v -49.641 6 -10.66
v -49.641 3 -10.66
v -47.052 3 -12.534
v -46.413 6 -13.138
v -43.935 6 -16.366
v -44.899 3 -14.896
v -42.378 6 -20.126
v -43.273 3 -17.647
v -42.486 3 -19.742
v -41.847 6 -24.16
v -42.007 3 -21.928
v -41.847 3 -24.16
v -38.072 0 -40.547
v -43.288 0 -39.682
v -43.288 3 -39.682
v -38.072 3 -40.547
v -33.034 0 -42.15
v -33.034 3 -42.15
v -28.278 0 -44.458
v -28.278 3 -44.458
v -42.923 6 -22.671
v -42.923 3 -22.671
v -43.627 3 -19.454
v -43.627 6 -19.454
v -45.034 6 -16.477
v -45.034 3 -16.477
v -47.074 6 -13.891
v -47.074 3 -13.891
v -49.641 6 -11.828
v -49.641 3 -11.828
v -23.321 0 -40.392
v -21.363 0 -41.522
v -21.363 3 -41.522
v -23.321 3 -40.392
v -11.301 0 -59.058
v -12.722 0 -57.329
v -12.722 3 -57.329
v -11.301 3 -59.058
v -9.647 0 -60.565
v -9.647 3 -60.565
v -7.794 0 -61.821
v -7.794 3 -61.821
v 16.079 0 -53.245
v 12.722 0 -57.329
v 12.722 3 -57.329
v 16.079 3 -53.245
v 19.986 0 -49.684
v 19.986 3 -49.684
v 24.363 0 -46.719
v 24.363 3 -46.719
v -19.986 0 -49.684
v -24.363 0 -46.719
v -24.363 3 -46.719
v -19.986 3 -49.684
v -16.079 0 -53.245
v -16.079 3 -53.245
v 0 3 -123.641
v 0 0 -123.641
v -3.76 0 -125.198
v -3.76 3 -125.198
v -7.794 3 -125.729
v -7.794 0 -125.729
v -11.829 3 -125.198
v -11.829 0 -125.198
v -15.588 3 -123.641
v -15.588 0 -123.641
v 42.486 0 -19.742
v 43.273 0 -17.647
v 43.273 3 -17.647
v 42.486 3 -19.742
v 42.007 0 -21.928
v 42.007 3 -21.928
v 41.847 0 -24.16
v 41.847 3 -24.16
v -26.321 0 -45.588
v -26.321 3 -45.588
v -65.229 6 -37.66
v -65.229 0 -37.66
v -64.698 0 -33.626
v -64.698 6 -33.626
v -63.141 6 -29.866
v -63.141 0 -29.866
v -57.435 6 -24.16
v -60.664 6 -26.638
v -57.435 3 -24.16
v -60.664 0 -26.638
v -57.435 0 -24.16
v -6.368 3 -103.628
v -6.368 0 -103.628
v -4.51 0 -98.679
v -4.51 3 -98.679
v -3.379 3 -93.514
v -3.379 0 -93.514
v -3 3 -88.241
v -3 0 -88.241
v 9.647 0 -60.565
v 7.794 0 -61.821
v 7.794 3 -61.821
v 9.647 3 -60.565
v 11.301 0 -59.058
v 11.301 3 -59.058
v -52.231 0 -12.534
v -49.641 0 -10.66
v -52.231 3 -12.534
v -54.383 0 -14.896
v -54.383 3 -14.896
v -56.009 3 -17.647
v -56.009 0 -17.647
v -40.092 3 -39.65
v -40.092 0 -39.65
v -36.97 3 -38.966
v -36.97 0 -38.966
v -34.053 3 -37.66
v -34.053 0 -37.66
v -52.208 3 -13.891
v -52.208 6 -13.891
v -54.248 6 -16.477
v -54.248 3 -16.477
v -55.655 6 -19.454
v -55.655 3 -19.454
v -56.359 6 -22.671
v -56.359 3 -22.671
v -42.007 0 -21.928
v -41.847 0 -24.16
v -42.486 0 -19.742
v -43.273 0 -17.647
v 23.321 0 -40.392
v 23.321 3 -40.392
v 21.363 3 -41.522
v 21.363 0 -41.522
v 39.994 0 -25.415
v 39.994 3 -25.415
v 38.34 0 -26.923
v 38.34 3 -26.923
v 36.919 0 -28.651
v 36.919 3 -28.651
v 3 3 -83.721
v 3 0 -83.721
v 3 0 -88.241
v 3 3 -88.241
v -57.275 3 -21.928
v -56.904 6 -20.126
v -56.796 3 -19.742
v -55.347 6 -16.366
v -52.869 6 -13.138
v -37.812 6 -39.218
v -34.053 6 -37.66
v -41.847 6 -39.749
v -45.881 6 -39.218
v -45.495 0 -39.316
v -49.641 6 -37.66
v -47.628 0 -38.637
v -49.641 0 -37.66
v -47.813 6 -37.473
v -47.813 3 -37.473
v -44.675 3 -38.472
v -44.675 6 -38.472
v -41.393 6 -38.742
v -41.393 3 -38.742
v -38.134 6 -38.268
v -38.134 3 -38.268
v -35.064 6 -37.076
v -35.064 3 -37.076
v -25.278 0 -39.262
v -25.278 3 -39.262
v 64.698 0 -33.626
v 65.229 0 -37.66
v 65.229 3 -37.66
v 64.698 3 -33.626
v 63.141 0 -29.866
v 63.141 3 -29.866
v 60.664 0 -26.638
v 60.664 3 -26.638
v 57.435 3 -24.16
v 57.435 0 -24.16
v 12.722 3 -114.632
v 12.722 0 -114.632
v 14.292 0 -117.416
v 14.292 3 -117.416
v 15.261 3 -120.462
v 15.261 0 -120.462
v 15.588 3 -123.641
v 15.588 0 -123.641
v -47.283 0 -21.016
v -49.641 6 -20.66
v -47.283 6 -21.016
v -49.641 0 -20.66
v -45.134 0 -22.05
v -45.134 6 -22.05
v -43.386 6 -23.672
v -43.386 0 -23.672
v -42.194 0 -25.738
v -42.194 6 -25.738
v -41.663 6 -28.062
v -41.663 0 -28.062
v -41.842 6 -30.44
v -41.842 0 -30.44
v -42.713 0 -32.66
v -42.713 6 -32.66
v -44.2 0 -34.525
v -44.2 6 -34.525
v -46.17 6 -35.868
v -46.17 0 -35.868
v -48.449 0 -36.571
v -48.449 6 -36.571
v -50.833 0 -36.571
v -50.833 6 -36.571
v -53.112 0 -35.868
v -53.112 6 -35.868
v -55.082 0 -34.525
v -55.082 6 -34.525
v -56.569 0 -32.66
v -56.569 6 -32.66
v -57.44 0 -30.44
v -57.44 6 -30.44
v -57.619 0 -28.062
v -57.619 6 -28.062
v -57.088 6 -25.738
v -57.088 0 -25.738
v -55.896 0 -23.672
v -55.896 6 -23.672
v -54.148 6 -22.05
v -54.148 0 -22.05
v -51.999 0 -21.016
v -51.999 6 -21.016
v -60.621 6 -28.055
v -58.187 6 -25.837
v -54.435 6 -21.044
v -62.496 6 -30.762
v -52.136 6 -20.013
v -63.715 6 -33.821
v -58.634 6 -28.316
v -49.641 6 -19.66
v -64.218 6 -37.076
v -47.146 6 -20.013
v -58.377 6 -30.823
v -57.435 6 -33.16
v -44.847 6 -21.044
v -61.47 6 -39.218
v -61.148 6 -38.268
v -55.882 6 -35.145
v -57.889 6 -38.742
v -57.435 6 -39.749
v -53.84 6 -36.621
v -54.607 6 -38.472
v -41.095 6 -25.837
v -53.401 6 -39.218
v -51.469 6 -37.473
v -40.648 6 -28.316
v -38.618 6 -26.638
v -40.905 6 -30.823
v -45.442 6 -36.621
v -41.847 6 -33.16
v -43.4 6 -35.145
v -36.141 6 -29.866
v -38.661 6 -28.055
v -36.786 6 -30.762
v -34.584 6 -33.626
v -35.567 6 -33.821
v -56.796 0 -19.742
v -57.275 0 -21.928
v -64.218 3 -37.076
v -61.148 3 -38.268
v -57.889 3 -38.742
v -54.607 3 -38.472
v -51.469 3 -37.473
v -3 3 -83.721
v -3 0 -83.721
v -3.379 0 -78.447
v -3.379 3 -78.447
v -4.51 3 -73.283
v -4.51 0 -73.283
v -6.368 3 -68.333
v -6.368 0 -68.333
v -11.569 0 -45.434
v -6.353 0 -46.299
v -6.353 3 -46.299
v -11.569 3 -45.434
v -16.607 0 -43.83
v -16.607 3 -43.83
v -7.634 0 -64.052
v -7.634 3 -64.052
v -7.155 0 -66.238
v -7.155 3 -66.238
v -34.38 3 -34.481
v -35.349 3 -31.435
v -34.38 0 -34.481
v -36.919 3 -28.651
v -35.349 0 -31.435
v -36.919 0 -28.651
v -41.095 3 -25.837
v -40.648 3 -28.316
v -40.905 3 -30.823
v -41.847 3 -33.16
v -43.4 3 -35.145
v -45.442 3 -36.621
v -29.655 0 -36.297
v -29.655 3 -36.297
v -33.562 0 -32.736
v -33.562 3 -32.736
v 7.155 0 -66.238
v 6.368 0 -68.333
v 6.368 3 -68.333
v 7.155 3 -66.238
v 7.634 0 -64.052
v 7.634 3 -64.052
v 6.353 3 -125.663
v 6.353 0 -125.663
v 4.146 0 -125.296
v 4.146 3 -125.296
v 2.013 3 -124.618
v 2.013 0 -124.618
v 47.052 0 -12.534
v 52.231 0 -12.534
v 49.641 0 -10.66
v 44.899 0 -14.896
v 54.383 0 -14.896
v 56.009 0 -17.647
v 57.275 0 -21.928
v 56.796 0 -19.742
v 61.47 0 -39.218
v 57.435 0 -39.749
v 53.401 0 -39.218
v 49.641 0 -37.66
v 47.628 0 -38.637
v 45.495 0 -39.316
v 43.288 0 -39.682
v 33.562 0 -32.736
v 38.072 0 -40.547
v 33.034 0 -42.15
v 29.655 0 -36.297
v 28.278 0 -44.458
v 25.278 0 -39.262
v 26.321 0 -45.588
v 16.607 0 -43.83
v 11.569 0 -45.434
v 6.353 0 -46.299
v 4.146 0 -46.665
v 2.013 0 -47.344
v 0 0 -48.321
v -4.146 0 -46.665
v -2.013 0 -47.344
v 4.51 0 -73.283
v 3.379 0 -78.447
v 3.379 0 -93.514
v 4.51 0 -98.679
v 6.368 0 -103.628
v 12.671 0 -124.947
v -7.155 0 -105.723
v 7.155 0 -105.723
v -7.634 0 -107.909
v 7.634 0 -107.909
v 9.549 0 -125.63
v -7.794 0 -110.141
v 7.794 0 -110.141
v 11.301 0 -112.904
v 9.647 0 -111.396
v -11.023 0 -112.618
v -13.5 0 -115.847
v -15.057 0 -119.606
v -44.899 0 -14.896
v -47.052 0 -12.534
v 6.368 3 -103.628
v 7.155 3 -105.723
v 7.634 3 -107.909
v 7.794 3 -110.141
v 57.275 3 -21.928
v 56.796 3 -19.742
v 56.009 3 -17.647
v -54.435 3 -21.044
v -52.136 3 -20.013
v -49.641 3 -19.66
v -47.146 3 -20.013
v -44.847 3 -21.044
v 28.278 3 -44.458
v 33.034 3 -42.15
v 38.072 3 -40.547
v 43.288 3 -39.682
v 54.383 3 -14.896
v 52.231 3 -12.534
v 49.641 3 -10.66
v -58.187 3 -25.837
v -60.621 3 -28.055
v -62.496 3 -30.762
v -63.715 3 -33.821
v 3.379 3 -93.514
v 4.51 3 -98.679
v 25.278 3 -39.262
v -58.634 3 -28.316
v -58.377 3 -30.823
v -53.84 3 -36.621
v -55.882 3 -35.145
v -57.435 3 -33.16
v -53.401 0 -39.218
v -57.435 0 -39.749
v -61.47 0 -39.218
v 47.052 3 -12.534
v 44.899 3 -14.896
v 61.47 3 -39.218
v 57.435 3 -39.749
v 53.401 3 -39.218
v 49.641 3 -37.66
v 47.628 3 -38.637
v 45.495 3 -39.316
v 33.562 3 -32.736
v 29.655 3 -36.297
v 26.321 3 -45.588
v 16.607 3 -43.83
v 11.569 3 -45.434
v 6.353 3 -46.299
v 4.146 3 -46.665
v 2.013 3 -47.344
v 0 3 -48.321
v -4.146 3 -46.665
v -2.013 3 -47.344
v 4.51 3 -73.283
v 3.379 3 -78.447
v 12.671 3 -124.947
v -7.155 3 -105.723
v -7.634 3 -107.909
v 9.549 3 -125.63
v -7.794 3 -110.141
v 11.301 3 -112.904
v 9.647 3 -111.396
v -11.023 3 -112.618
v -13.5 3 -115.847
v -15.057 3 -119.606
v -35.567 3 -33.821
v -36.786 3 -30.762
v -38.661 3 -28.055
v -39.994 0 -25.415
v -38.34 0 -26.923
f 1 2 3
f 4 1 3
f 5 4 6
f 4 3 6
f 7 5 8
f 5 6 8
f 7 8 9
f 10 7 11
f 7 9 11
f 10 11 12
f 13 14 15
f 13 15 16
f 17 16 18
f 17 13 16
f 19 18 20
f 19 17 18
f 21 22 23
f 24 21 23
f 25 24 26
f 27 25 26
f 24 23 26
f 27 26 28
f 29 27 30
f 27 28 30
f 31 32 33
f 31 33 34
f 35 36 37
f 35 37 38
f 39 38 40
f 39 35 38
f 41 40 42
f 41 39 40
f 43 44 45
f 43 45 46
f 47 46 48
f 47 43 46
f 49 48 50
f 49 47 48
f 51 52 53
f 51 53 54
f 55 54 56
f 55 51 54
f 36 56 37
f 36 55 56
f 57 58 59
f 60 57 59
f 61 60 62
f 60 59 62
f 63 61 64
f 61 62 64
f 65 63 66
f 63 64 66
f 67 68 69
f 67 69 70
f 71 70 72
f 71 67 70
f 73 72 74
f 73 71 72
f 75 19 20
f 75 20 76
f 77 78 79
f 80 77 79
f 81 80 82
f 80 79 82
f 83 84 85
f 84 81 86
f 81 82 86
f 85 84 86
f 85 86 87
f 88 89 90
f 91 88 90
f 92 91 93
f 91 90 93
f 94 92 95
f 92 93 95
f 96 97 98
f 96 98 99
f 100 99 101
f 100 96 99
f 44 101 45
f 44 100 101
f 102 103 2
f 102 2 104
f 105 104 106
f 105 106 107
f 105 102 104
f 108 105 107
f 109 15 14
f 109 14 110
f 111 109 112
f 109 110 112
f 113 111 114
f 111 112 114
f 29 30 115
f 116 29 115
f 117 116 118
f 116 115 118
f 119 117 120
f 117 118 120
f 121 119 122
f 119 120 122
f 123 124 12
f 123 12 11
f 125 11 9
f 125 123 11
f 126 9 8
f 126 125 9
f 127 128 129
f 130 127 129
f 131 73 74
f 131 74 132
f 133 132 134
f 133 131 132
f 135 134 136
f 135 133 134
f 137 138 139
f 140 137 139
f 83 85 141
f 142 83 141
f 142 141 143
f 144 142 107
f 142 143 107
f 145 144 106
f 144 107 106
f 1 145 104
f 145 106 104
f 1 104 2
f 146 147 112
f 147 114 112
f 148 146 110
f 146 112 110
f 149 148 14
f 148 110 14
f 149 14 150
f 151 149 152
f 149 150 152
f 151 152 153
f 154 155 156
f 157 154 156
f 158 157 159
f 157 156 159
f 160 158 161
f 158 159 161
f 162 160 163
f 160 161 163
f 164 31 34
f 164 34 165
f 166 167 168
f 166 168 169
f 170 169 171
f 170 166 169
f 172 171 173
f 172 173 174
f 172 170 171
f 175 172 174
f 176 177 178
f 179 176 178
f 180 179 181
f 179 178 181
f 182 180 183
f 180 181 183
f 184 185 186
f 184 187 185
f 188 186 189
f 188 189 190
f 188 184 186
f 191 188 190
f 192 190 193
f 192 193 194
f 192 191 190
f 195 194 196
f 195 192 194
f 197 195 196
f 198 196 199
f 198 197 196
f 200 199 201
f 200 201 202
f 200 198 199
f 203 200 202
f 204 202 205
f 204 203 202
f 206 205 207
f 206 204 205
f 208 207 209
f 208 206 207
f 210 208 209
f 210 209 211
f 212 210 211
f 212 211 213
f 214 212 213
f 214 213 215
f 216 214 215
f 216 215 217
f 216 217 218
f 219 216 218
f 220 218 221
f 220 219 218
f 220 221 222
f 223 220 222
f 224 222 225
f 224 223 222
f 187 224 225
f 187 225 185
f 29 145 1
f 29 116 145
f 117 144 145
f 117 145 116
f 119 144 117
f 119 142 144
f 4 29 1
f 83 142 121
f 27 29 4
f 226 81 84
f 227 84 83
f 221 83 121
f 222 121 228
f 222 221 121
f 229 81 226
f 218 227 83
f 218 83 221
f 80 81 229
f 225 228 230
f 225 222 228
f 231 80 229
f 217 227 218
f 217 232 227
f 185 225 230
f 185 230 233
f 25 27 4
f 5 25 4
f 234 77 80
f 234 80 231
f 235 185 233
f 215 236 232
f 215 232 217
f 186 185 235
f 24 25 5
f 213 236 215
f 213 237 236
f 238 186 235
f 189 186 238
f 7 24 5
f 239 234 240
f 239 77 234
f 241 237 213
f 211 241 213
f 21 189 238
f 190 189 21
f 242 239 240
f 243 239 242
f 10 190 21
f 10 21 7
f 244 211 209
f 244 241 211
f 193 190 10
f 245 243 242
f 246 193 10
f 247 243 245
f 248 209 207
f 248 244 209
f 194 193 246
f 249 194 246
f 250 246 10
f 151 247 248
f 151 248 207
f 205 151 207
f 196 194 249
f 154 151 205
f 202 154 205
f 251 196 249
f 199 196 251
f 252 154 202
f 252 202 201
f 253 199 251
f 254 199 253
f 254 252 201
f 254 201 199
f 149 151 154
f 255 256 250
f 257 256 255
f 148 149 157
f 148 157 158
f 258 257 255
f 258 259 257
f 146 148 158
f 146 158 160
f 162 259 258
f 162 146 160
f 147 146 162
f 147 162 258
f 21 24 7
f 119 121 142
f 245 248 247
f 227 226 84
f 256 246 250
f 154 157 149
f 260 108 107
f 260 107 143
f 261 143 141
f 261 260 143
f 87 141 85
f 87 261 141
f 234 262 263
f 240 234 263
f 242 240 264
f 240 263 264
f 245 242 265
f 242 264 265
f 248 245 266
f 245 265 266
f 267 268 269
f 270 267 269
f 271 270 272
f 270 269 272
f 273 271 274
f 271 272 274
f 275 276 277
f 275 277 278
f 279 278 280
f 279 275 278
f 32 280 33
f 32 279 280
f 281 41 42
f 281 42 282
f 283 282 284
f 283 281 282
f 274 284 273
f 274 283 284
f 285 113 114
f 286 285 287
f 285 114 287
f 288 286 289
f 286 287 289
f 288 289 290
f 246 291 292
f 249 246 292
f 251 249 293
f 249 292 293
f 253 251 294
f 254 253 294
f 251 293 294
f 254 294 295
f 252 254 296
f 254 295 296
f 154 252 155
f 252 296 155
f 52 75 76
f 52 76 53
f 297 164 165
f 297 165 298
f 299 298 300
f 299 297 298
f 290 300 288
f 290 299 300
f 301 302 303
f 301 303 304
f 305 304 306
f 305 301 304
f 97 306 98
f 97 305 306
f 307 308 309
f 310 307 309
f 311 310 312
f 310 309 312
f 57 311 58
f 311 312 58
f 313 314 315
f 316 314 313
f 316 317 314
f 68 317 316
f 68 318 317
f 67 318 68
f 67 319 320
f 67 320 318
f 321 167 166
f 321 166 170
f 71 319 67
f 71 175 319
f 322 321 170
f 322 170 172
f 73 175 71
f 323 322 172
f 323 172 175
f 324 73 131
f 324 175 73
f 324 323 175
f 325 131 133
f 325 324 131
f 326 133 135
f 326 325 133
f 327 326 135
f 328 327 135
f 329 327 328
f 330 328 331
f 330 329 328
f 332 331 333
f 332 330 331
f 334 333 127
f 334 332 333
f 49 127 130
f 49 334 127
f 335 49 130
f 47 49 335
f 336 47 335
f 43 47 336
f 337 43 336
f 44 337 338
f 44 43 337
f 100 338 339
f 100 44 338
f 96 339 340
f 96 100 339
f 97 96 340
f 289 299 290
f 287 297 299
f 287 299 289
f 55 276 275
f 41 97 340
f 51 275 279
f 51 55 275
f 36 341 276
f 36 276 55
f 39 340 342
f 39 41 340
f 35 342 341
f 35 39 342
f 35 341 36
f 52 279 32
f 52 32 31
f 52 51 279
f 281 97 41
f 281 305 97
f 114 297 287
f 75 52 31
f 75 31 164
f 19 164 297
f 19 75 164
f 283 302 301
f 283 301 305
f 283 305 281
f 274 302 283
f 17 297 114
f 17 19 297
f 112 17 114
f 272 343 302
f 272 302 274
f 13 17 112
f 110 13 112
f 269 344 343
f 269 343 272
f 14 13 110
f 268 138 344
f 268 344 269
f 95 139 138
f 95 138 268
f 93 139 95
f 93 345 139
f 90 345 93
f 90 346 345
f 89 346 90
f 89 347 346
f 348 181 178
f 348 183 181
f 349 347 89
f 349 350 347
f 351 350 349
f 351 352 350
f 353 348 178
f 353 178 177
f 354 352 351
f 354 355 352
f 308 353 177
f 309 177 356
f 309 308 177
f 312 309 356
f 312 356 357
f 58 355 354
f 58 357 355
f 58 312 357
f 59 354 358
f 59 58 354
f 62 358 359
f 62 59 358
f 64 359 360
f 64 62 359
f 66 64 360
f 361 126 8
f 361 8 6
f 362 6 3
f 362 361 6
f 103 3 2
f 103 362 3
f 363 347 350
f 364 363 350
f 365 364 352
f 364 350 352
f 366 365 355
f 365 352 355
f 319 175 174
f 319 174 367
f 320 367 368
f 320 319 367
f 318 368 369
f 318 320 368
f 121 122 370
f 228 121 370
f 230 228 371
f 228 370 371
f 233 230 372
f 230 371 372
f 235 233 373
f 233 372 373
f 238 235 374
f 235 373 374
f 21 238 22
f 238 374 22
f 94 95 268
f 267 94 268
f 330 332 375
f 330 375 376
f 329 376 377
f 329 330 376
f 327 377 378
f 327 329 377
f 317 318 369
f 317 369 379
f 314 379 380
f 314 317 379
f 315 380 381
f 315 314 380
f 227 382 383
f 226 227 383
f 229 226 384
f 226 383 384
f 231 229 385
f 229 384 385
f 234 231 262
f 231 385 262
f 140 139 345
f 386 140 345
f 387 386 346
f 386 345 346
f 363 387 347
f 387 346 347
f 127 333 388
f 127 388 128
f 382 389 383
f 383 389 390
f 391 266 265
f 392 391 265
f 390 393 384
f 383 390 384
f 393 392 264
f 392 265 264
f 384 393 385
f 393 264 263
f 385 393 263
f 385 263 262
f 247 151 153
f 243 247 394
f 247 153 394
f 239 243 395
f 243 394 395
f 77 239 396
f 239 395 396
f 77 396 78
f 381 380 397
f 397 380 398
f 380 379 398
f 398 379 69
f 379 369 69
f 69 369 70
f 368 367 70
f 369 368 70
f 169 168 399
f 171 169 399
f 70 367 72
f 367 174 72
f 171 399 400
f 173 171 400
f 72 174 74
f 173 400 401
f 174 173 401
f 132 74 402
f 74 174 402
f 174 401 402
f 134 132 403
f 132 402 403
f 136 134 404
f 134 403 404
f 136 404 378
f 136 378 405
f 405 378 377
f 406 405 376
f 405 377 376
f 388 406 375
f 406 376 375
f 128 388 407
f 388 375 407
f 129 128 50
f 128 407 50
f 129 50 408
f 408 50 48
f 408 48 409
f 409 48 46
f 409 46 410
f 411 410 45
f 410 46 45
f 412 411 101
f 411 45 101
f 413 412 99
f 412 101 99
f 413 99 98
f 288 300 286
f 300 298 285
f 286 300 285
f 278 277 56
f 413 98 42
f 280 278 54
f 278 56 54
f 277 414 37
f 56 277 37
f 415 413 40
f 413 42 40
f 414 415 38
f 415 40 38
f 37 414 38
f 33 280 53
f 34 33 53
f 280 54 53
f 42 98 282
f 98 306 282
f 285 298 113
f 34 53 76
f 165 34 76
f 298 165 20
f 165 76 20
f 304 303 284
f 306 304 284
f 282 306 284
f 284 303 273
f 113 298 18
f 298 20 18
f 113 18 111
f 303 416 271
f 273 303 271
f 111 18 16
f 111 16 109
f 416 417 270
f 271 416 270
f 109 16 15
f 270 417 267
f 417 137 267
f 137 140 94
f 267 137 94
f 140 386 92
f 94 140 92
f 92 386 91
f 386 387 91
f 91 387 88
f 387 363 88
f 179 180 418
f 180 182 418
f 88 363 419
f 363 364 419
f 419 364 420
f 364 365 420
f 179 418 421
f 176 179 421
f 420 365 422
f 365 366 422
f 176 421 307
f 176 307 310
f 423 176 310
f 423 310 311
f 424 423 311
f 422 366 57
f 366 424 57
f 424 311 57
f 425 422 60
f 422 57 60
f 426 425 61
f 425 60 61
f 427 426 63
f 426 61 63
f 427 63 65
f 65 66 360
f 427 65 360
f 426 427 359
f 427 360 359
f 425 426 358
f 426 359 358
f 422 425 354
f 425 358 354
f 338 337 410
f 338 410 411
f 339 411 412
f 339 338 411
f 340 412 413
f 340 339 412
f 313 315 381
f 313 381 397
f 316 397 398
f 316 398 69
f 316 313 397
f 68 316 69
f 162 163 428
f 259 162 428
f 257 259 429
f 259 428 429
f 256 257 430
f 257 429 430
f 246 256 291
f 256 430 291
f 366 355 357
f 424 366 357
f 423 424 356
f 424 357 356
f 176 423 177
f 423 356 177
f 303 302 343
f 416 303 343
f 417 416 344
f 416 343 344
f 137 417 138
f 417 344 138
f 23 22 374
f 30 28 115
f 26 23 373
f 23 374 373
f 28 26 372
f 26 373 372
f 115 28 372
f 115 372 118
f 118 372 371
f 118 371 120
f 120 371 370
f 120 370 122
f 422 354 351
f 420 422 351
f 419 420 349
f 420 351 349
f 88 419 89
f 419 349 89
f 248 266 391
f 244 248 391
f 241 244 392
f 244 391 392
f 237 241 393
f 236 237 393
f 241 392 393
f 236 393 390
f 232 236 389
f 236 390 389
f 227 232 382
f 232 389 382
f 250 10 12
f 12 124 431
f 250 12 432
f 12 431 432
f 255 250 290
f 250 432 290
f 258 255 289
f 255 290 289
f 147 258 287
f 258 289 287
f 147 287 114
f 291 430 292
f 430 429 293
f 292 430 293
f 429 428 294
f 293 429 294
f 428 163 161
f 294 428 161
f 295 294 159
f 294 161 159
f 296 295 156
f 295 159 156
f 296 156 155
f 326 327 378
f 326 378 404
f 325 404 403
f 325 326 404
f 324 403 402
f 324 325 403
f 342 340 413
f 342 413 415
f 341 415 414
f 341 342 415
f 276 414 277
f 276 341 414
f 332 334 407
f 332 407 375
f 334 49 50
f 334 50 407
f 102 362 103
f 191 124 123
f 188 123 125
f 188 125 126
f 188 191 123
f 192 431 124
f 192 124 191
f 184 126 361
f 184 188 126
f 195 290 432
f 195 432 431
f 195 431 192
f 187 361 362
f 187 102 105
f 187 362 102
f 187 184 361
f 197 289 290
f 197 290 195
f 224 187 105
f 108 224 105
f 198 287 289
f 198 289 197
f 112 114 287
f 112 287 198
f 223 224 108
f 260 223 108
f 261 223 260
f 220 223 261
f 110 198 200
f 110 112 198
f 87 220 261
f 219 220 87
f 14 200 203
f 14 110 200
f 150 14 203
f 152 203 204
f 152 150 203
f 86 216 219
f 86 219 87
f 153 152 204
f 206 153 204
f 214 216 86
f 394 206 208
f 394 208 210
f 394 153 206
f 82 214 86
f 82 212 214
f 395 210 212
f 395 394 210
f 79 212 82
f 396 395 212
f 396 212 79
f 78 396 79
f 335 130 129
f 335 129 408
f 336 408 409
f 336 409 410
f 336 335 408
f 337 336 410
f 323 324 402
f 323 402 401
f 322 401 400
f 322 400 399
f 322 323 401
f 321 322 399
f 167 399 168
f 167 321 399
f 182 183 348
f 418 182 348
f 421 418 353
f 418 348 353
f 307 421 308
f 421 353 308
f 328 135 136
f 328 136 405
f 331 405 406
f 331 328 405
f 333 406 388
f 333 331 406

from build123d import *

# Parameters (mm, degrees)
BOSS_EXTRUDE2_DEPTH    = 3
SKETCH12_R             = 8
BOSS_EXTRUDE3_DEPTH    = 3
CUT_EXTRUDE1_START     = -3
SKETCH15_R             = 8
CUT_EXTRUDE1_DEPTH     = 3
SPLIT1_SURFACE_1_BACK  = 175.059
SPLIT1_SURFACE_1_DEPTH = 350.118
SPLIT1_SURFACE_2_BACK  = 175.059
SPLIT1_SURFACE_2_DEPTH = 350.118


with BuildPart() as part:
    # Sketch3 → Boss-Extrude2 (new body)
    with BuildSketch(Plane(origin=(0, 0, 0), x_dir=(1, 0, 0), z_dir=(0, 1, 0))):
        with BuildLine():
            ThreePointArc((-49.641016151, 10.660254038), (-53.367697775, 13.659367084), (-56.009477801, 17.647328127))
            ThreePointArc((-56.009477801, 17.647328127), (-57.074631953, 20.826674302), (-57.435244785, 24.160254038))
            ThreePointArc((-57.435244785, 24.160254038), (-63.141016151, 29.866025404), (-65.229473419, 37.660254038))
            ThreePointArc((-65.229473419, 37.660254038), (-57.435244785, 39.748711306), (-49.641016151, 37.660254038))
            ThreePointArc((-49.641016151, 37.660254038), (-46.573744998, 39.014744032), (-43.287773367, 39.681966565))
            ThreePointArc((-43.287773367, 39.681966565), (-35.524464535, 41.258320585), (-28.27784895, 44.458385987))
            Line((-28.27784895, 44.458385987), (-26.320508076, 45.588457268))
            Line((-26.320508076, 45.588457268), (-24.363167201, 46.718528549))
            ThreePointArc((-24.363167201, 46.718528549), (-17.968521476, 51.394249035), (-12.721704434, 57.329294692))
            ThreePointArc((-12.721704434, 57.329294692), (-10.500886954, 59.841418334), (-7.794228634, 61.820508076))
            ThreePointArc((-7.794228634, 61.820508076), (-5.705771366, 69.61473671), (0, 75.320508076))
            ThreePointArc((0, 75.320508076), (5.705771366, 69.61473671), (7.794228634, 61.820508076))
            ThreePointArc((7.794228634, 61.820508076), (10.500886954, 59.841418334), (12.721704434, 57.329294692))
            ThreePointArc((12.721704434, 57.329294692), (17.968521476, 51.394249035), (24.363167201, 46.718528549))
            Line((24.363167201, 46.718528549), (26.320508076, 45.588457268))
            Line((26.320508076, 45.588457268), (28.27784895, 44.458385987))
            ThreePointArc((28.27784895, 44.458385987), (35.524464535, 41.258320585), (43.287773367, 39.681966565))
            ThreePointArc((43.287773367, 39.681966565), (46.573744998, 39.014744032), (49.641016151, 37.660254038))
            ThreePointArc((49.641016151, 37.660254038), (57.435244785, 39.748711306), (65.229473419, 37.660254038))
            ThreePointArc((65.229473419, 37.660254038), (63.141016151, 29.866025404), (57.435244785, 24.160254038))
            ThreePointArc((57.435244785, 24.160254038), (57.074631953, 20.826674302), (56.009477801, 17.647328127))
            ThreePointArc((56.009477801, 17.647328127), (53.367697775, 13.659367084), (49.641016151, 10.660254038))
            ThreePointArc((49.641016151, 10.660254038), (45.914334527, 13.659367084), (43.272554502, 17.647328127))
            ThreePointArc((43.272554502, 17.647328127), (42.20740035, 20.826674302), (41.846787517, 24.160254038))
            ThreePointArc((41.846787517, 24.160254038), (39.140129197, 26.13934378), (36.919311718, 28.651467422))
            ThreePointArc((36.919311718, 28.651467422), (31.672494675, 34.586513078), (25.27784895, 39.262233565))
            Line((25.27784895, 39.262233565), (23.320508076, 40.392304845))
            Line((23.320508076, 40.392304845), (21.363167201, 41.522376126))
            ThreePointArc((21.363167201, 41.522376126), (14.116551616, 44.722441529), (6.353242784, 46.298795548))
            ThreePointArc((6.353242784, 46.298795548), (3.067271153, 46.966018082), (0, 48.320508076))
            ThreePointArc((0, 48.320508076), (-3.067271153, 46.966018082), (-6.353242784, 46.298795548))
            ThreePointArc((-6.353242784, 46.298795548), (-14.116551616, 44.722441529), (-21.363167201, 41.522376126))
            Line((-21.363167201, 41.522376126), (-23.320508076, 40.392304845))
            Line((-23.320508076, 40.392304845), (-25.27784895, 39.262233565))
            ThreePointArc((-25.27784895, 39.262233565), (-31.672494675, 34.586513078), (-36.919311718, 28.651467422))
            ThreePointArc((-36.919311718, 28.651467422), (-39.140129197, 26.13934378), (-41.846787517, 24.160254038))
            ThreePointArc((-41.846787517, 24.160254038), (-42.20740035, 20.826674302), (-43.272554502, 17.647328127))
            ThreePointArc((-43.272554502, 17.647328127), (-45.914334527, 13.659367084), (-49.641016151, 10.660254038))
        make_face()
        with BuildLine():
            Line((-3, 85.980762114), (-3, 83.720619552))
            ThreePointArc((-3, 83.720619552), (-3.85196986, 75.844833663), (-6.36846165, 68.333433987))
            ThreePointArc((-6.36846165, 68.333433987), (-3.726681624, 72.32139503), (0, 75.320508076))
            ThreePointArc((0, 75.320508076), (3.726681624, 72.32139503), (6.36846165, 68.333433987))
            ThreePointArc((6.36846165, 68.333433987), (3.85196986, 75.844833663), (3, 83.720619552))
            Line((3, 83.720619552), (3, 85.980762114))
            Line((3, 85.980762114), (3, 88.240904675))
            ThreePointArc((3, 88.240904675), (3.85196986, 96.116690564), (6.36846165, 103.62809024))
            ThreePointArc((6.36846165, 103.62809024), (7.433615801, 106.807436416), (7.794228634, 110.141016151))
            ThreePointArc((7.794228634, 110.141016151), (10.500886954, 112.120105893), (12.721704434, 114.632229535))
            ThreePointArc((12.721704434, 114.632229535), (14.854489994, 118.91405867), (15.588457268, 123.641016151))
            ThreePointArc((15.588457268, 123.641016151), (11.12780837, 125.368860587), (6.353242784, 125.662728679))
            ThreePointArc((6.353242784, 125.662728679), (3.067271153, 124.995506145), (0, 123.641016151))
            ThreePointArc((0, 123.641016151), (-7.794228634, 125.729473419), (-15.588457268, 123.641016151))
            ThreePointArc((-15.588457268, 123.641016151), (-13.5, 115.846787517), (-7.794228634, 110.141016151))
            ThreePointArc((-7.794228634, 110.141016151), (-7.433615801, 106.807436416), (-6.36846165, 103.62809024))
            ThreePointArc((-6.36846165, 103.62809024), (-3.85196986, 96.116690564), (-3, 88.240904675))
            Line((-3, 88.240904675), (-3, 85.980762114))
        make_face()
    extrude(amount=BOSS_EXTRUDE2_DEPTH)

    # Sketch12 → Boss-Extrude3 (add)
    with BuildSketch(Plane(origin=(0, 3, 0), x_dir=(1, 0, 0), z_dir=(0, 1, 0))):
        with BuildLine():
            ThreePointArc((-57.435244785, 24.160254038), (-55.346787517, 16.366025404), (-49.641016151, 10.660254038))
            ThreePointArc((-49.641016151, 10.660254038), (-43.935244785, 16.366025404), (-41.846787517, 24.160254038))
            ThreePointArc((-41.846787517, 24.160254038), (-36.141016151, 29.866025404), (-34.052558883, 37.660254038))
            ThreePointArc((-34.052558883, 37.660254038), (-41.846787517, 39.748711306), (-49.641016151, 37.660254038))
            ThreePointArc((-49.641016151, 37.660254038), (-57.435244785, 39.748711306), (-65.229473419, 37.660254038))
            ThreePointArc((-65.229473419, 37.660254038), (-63.141016151, 29.866025404), (-57.435244785, 24.160254038))
        make_face()
        with BuildLine():
            ThreePointArc((-41.095384464, 25.83674929), (-41.846787517, 33.160254038), (-47.813427147, 37.472740545))
            ThreePointArc((-47.813427147, 37.472740545), (-41.393201216, 38.741658117), (-35.064256985, 37.076149866))
            ThreePointArc((-35.064256985, 37.076149866), (-36.786356645, 30.762369258), (-41.095384464, 25.83674929))
        make_face(mode=Mode.SUBTRACT)
        with BuildLine():
            ThreePointArc((-42.922973468, 22.671272279), (-45.03417158, 16.476734738), (-49.641016151, 11.828462381))
            ThreePointArc((-49.641016151, 11.828462381), (-54.247860722, 16.476734738), (-56.359058835, 22.671272279))
            ThreePointArc((-56.359058835, 22.671272279), (-49.641016151, 19.660254038), (-42.922973468, 22.671272279))
        make_face(mode=Mode.SUBTRACT)
        with BuildLine():
            ThreePointArc((-51.468605156, 37.472740545), (-57.435244785, 33.160254038), (-58.186647839, 25.83674929))
            ThreePointArc((-58.186647839, 25.83674929), (-62.495675658, 30.762369258), (-64.217775317, 37.076149866))
            ThreePointArc((-64.217775317, 37.076149866), (-57.888831087, 38.741658117), (-51.468605156, 37.472740545))
        make_face(mode=Mode.SUBTRACT)
        with Locations(Location((-49.641016151, 28.660254038, 0), (0, 0, 270))):
            Circle(SKETCH12_R, mode=Mode.SUBTRACT)
    extrude(amount=BOSS_EXTRUDE3_DEPTH)

    # Sketch15 → Cut-Extrude1 (cut)
    with BuildSketch(Plane(origin=(0, 3, 0), x_dir=(1, 0, 0), z_dir=(0, 1, 0)).offset(CUT_EXTRUDE1_START)):
        with Locations(Location((-49.641016151, 28.660254038, 0), (0, 0, 270))):
            Circle(SKETCH15_R)
    extrude(amount=CUT_EXTRUDE1_DEPTH, mode=Mode.SUBTRACT)


with BuildPart() as body_2:
    # Split1: the piece behind the surface
    add(part.part)
    # Split1 surface: a surface, the sketch's curves swept straight by 350.118 mm
    with BuildLine(Plane(origin=(0, 3, 0), x_dir=(1, 0, 0), z_dir=(0, 1, 0)).offset(-SPLIT1_SURFACE_1_BACK), mode=Mode.PRIVATE) as split1_surface_1_path:
        ThreePointArc((-43.287773367, 39.681966565), (-38.513207782, 39.388098473), (-34.052558883, 37.660254038))
        ThreePointArc((-34.052558883, 37.660254038), (-34.786526158, 32.933296557), (-36.919311718, 28.651467422))
    split1_surface_1 = Shell.extrude(split1_surface_1_path.wire(), (0 * SPLIT1_SURFACE_1_DEPTH, 1 * SPLIT1_SURFACE_1_DEPTH, 0 * SPLIT1_SURFACE_1_DEPTH))
    split(bisect_by=split1_surface_1, keep=Keep.BOTTOM)


with BuildPart() as part_1:
    add(part.part)

    # Split1: split by a surface, the side it looks to stays
    # Split1 surface: a surface, the sketch's curves swept straight by 350.118 mm
    with BuildLine(Plane(origin=(0, 3, 0), x_dir=(1, 0, 0), z_dir=(0, 1, 0)).offset(-SPLIT1_SURFACE_2_BACK), mode=Mode.PRIVATE) as split1_surface_2_path:
        ThreePointArc((-43.287773367, 39.681966565), (-38.513207782, 39.388098473), (-34.052558883, 37.660254038))
        ThreePointArc((-34.052558883, 37.660254038), (-34.786526158, 32.933296557), (-36.919311718, 28.651467422))
    split1_surface_2 = Shell.extrude(split1_surface_2_path.wire(), (0 * SPLIT1_SURFACE_2_DEPTH, 1 * SPLIT1_SURFACE_2_DEPTH, 0 * SPLIT1_SURFACE_2_DEPTH))
    split(bisect_by=split1_surface_2, keep=Keep.TOP)


solid = Compound([body_2.part, part_1.part])
